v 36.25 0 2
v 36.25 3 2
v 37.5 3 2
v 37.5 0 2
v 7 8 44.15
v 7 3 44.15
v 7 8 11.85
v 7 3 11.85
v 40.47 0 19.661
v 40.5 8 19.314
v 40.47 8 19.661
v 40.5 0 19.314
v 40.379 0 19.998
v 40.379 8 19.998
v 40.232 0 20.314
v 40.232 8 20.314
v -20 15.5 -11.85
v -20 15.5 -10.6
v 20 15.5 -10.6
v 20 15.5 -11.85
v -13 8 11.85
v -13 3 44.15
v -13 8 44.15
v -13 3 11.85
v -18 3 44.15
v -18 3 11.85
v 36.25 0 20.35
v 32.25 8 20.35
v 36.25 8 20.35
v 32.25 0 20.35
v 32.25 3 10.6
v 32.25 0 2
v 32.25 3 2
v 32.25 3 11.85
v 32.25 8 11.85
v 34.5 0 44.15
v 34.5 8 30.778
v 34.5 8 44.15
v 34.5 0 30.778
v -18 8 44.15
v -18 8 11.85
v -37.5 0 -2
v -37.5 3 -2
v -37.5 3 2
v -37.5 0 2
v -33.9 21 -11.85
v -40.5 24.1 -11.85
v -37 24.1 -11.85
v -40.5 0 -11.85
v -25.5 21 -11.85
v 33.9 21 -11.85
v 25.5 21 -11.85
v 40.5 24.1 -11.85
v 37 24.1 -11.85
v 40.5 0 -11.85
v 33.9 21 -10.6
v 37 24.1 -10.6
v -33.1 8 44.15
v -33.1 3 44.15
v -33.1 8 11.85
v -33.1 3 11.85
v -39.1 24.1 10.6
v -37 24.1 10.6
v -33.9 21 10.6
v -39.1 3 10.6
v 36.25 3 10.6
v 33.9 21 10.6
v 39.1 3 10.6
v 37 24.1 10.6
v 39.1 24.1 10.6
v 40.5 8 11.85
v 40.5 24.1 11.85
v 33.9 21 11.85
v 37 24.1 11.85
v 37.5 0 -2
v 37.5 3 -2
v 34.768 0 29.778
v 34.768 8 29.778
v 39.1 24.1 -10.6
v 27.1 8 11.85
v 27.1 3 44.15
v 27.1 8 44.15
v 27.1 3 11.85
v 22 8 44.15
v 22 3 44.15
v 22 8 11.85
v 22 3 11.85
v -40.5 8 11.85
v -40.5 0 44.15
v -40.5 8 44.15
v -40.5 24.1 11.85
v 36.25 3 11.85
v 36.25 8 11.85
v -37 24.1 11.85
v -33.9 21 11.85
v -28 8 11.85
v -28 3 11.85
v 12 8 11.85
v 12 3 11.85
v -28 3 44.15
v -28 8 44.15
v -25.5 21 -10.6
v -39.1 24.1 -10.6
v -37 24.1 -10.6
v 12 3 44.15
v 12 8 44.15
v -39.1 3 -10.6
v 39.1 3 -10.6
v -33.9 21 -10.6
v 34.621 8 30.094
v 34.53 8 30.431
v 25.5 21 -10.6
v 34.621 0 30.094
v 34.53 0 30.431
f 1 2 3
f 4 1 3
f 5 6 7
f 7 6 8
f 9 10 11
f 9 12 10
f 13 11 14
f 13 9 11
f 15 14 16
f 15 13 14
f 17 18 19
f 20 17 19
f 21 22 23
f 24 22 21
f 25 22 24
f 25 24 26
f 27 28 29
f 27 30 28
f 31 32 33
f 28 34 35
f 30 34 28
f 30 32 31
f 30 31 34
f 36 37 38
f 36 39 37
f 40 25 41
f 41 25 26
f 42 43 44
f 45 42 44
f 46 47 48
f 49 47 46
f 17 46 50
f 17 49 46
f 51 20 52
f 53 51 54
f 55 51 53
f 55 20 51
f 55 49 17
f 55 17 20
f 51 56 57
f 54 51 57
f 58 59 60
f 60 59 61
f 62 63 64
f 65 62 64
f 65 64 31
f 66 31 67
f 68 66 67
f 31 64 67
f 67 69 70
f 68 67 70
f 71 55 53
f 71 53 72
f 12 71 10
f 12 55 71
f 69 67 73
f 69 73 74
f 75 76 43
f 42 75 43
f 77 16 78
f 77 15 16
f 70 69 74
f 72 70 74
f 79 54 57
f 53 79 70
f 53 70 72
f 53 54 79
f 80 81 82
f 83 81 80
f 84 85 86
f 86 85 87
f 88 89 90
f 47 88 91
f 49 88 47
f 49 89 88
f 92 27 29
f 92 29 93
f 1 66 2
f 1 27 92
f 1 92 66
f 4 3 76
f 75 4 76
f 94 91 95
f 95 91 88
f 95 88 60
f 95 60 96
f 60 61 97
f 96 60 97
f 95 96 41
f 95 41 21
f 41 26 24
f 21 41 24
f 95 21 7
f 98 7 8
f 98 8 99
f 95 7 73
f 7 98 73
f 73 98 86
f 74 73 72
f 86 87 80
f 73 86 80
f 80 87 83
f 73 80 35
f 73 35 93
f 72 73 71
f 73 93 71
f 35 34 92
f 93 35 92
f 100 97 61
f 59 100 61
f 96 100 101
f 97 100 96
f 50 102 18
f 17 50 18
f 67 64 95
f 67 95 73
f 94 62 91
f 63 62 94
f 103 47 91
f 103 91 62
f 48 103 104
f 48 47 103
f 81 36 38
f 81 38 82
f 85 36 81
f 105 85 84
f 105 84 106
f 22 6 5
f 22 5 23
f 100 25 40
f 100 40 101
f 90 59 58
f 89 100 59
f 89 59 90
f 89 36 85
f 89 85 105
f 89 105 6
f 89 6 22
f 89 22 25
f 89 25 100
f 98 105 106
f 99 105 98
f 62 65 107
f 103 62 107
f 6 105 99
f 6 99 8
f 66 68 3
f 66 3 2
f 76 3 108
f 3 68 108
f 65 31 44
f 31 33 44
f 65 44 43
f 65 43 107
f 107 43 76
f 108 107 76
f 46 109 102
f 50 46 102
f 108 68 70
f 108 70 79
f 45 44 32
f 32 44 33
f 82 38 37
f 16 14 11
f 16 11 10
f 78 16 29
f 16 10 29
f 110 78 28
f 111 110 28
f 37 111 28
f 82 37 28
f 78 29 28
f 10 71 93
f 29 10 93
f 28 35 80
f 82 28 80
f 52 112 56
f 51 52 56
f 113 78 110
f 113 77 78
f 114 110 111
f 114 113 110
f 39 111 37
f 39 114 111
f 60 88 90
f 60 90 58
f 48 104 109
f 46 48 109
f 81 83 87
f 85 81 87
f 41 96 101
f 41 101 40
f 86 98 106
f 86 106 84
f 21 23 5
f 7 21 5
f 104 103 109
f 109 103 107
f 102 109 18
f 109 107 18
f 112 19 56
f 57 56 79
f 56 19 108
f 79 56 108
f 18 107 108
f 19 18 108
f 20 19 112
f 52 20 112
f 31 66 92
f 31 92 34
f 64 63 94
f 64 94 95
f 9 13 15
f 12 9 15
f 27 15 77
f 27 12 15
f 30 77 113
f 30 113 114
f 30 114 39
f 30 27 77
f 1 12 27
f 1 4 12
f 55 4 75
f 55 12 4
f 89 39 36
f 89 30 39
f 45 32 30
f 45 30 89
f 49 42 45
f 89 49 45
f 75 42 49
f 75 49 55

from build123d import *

# Parameters (mm, degrees)
BOSS_EXTRUDE1_DEPTH = 3
SKETCH7_W           = 81
SKETCH7_H           = 23.7
SKETCH7_W_2         = 78.2
SKETCH7_H_2         = 21.2
BOSS_EXTRUDE4_DEPTH = 23.5
CUT_EXTRUDE7_START  = -22.45
CUT_EXTRUDE7_DEPTH  = 22.45
CUT_EXTRUDE8_DEPTH  = 4
CUT_EXTRUDE9_DEPTH  = 4
SKETCH17_W          = 7.4
SKETCH17_H          = 32.3
SKETCH17_W_2        = 10
SKETCH17_W_3        = 20
BOSS_EXTRUDE5_DEPTH = 5
CUT_EXTRUDE10_DEPTH = 1.25
FILLET1_R           = 2


with BuildPart() as part:
    # Sketch1 → Boss-Extrude1 (new body)
    with BuildSketch(Plane(origin=(0, 0, 0), x_dir=(1, 0, 0), z_dir=(0, 1, 0))):
        Polygon((-40.5, -11.85), (-40.5, 11.85), (0, 11.85), (40.5, 11.85), (40.5, -11.85), (40.5, -19.85), (34.5, -30.242304845), (34.5, -44.15), (-40.5, -44.15), align=None)
    extrude(amount=BOSS_EXTRUDE1_DEPTH)

    # Sketch7 → Boss-Extrude4 (add)
    with BuildSketch(Plane(origin=(0, 3, 0), x_dir=(1, 0, 0), z_dir=(0, 1, 0))):
        Rectangle(SKETCH7_W, SKETCH7_H)
        Rectangle(SKETCH7_W_2, SKETCH7_H_2, mode=Mode.SUBTRACT)
    extrude(amount=BOSS_EXTRUDE4_DEPTH)

    # Sketch16 → Cut-Extrude7 (cut)
    with BuildSketch(Plane(origin=(0, 0, -11.85), x_dir=(-1, 0, 0), z_dir=(0, 0, -1)).offset(CUT_EXTRUDE7_START)):
        Polygon((-40.5, 26.5), (40.5, 26.5), (40.5, 24.1), (37, 24.1), (33.9, 21), (25.5, 21), (20, 15.5), (-20, 15.5), (-25.5, 21), (-33.9, 21), (-37, 24.1), (-40.5, 24.1), align=None)
    extrude(amount=CUT_EXTRUDE7_DEPTH, mode=Mode.SUBTRACT)

    # Sketch8 → Cut-Extrude8 (cut)
    with BuildSketch(Plane(origin=(0, 3, 0), x_dir=(1, 0, 0), z_dir=(0, 1, 0))):
        Polygon((33.5, -2), (37.5, -2), (37.5, 2), (-37.5, 2), (-37.5, -2), align=None)
    extrude(amount=-CUT_EXTRUDE8_DEPTH, mode=Mode.SUBTRACT)

    # Sketch14 → Cut-Extrude9 (cut)
    with BuildSketch(Plane(origin=(0, 3, 0), x_dir=(1, 0, 0), z_dir=(0, 1, 0))):
        Polygon((36.25, -11.85), (36.25, -20.35), (32.25, -20.35), (32.25, -11.85), (32.25, 0.15), (36.25, 0.15), align=None)
    extrude(amount=-CUT_EXTRUDE9_DEPTH, mode=Mode.SUBTRACT)

    # Sketch17 → Boss-Extrude5 (add)
    with BuildSketch(Plane(origin=(0, 3, 0), x_dir=(1, 0, 0), z_dir=(0, 1, 0))):
        Polygon((32.25, -20.35), (36.25, -20.35), (36.25, -11.85), (40.5, -11.85), (40.5, -19.85), (34.5, -30.242304845), (34.5, -44.15), (27.1, -44.15), (27.1, -11.85), (32.25, -11.85), align=None)
        with Locations((-36.8, -28)):
            Rectangle(SKETCH17_W, SKETCH17_H)
        with Locations((-23, -28)):
            Rectangle(SKETCH17_W_2, SKETCH17_H)
        with Locations((-3, -28)):
            Rectangle(SKETCH17_W_3, SKETCH17_H)
        with Locations((17, -28)):
            Rectangle(SKETCH17_W_2, SKETCH17_H)
    extrude(amount=BOSS_EXTRUDE5_DEPTH)

    # Sketch18 → Cut-Extrude10 (cut)
    with BuildSketch(Plane(origin=(0, 0, 10.6), x_dir=(-1, 0, 0), z_dir=(0, 0, -1))):
        Polygon((40.5, 26.5), (40.5, 24.1), (37, 24.1), (33.9, 21), (-33.9, 21), (-37, 24.1), (-40.5, 24.1), (-40.5, 26.5), align=None)
    extrude(amount=-CUT_EXTRUDE10_DEPTH, mode=Mode.SUBTRACT)

    # Fillet1
    fillet1_edges = [part.edges().sort_by_distance(p)[0] for p in [
        (40.5, 4, 19.85),
        (34.5, 4, 30.242304845),
    ]]
    fillet(fillet1_edges, radius=FILLET1_R)


solid = part.part
